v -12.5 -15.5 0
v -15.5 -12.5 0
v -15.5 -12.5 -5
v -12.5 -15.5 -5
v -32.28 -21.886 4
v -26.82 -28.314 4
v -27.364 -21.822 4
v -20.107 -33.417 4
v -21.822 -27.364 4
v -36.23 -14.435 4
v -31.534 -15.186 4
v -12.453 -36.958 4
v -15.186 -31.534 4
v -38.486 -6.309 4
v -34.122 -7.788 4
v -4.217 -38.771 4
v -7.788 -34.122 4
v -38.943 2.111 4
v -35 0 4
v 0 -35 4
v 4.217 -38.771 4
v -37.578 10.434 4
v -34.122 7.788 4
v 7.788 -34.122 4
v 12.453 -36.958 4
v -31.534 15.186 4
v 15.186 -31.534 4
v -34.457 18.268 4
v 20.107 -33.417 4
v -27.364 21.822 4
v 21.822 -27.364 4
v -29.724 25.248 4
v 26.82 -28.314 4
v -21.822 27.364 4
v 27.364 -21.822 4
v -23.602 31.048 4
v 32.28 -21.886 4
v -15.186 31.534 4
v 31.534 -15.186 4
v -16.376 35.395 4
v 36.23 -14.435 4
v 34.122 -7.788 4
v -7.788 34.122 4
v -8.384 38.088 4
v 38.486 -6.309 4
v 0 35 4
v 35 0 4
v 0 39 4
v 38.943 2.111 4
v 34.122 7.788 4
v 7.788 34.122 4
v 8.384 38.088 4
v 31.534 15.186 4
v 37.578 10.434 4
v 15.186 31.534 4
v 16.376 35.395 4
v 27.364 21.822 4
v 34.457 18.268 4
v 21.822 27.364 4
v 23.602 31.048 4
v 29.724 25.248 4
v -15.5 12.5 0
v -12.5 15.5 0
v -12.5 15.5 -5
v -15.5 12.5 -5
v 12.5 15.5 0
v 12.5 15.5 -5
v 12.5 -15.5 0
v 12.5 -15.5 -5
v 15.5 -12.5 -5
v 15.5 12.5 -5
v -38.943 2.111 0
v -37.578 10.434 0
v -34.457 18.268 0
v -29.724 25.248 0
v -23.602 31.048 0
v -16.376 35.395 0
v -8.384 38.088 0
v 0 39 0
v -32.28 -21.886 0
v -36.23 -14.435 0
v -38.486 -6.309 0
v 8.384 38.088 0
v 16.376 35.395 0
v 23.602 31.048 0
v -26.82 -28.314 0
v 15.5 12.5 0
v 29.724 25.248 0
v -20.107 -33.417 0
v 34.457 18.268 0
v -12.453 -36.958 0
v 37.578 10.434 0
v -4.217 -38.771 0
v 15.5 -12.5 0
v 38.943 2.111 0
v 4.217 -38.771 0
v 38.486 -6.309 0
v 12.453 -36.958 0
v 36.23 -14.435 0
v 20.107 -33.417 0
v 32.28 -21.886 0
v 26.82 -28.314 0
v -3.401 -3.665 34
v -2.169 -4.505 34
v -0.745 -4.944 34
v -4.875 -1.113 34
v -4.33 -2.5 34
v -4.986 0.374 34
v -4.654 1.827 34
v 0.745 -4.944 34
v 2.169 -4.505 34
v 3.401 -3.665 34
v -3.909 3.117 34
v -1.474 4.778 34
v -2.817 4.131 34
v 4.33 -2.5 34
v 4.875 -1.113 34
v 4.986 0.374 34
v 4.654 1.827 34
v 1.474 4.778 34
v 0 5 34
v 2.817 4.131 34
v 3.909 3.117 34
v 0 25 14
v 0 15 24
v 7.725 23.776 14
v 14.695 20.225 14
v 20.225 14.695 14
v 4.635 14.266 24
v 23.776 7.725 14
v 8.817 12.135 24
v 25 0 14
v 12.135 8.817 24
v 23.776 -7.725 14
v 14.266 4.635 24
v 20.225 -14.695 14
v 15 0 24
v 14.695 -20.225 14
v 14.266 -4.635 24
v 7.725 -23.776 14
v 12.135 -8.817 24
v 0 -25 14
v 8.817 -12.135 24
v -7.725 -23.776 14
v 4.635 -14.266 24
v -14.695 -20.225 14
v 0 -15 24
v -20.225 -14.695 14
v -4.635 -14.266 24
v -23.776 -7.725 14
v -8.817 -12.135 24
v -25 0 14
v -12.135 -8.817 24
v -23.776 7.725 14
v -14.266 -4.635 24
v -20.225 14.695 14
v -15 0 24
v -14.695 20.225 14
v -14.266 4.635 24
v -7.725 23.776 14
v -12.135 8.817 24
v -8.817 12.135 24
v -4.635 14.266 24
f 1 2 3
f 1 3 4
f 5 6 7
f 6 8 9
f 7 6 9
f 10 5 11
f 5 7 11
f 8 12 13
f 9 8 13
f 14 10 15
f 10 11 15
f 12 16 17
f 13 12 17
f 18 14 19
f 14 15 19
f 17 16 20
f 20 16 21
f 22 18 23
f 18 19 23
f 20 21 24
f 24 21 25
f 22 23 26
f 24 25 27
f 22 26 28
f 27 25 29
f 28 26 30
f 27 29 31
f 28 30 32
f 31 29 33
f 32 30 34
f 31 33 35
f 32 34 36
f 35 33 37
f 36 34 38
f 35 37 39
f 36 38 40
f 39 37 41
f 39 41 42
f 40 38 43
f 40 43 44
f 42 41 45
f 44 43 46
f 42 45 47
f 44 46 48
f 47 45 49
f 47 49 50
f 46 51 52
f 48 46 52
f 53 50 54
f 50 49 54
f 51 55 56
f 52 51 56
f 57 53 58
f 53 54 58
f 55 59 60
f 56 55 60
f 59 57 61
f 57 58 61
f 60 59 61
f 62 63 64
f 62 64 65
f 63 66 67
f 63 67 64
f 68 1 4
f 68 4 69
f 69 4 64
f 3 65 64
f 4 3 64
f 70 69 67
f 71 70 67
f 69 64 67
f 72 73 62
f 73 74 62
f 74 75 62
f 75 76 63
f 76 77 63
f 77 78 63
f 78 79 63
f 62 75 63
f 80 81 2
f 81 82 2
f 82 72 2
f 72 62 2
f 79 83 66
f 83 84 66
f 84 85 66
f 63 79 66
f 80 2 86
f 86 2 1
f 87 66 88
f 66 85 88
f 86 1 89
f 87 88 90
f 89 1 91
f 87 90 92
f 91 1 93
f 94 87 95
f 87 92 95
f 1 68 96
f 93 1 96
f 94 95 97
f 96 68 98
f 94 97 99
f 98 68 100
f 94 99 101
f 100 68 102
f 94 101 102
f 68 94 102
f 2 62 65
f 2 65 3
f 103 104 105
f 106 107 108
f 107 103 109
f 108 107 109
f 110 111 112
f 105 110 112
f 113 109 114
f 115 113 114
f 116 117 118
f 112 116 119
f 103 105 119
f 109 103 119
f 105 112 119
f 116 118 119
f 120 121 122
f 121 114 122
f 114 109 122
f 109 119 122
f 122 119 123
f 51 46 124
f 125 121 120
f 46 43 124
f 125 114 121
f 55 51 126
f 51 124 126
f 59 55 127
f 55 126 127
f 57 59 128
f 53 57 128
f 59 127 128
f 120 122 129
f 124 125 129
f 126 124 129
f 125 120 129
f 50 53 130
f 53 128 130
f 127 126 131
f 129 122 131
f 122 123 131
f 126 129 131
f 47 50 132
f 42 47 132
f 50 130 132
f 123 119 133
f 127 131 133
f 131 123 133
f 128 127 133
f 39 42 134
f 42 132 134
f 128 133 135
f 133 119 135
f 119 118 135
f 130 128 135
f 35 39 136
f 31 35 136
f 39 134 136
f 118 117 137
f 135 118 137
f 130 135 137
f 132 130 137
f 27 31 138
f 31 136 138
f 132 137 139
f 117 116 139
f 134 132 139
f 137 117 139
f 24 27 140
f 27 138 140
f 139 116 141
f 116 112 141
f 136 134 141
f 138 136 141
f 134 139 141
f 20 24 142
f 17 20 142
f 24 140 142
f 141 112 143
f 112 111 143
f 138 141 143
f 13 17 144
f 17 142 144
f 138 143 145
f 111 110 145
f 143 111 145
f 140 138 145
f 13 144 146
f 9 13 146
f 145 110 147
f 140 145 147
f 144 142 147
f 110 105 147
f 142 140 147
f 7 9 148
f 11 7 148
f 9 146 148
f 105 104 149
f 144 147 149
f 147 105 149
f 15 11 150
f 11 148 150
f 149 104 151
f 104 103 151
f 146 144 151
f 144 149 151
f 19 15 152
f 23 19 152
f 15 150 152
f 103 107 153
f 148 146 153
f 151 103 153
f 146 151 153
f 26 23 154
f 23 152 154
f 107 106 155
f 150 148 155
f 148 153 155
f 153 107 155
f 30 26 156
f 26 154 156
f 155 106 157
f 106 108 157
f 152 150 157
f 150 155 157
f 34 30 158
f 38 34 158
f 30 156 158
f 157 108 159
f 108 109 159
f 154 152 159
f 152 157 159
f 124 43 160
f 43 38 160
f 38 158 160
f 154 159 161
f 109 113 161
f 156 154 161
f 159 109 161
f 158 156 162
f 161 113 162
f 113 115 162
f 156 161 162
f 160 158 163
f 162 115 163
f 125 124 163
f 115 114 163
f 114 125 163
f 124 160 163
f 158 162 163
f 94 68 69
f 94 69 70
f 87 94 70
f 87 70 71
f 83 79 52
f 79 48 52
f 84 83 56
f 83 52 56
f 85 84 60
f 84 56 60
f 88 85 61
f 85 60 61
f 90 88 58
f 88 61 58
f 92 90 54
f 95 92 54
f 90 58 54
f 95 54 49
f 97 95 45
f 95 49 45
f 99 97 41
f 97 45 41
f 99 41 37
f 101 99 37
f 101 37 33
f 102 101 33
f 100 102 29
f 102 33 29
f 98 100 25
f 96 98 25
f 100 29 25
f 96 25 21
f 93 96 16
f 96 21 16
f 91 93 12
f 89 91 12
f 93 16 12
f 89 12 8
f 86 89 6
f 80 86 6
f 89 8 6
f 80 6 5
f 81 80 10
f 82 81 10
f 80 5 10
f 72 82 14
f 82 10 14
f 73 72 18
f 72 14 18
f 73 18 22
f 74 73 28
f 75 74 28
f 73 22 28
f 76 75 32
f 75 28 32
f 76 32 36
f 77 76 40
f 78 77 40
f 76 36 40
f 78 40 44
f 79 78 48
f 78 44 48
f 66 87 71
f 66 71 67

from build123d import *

# Parameters (mm, degrees)
EXTRUDE_1_DEPTH = 5


with BuildPart() as part:
    # Эскиз1 → Повернуть1 (revolve)
    with BuildSketch(Plane(origin=(0, 0, 0), x_dir=(0, 0, -1), z_dir=(1, 0, 0))):
        Polygon((0, 0), (0, 39), (-4, 39), (-4, 35), (-34, 5), (-34, 0), align=None)
    revolve(axis=Axis((0, 0, 926.802095793), (0, 0, -1)))

    # Эскиз2 → Бобышка-Вытянуть1 (add)
    with BuildSketch(Plane(origin=(0, 0, 0), x_dir=(-1, 0, 0), z_dir=(0, 0, -1))):
        Polygon((12.5, -15.5), (-12.5, -15.5), (-15.5, -12.5), (-15.5, 12.5), (-12.5, 15.5), (12.5, 15.5), (15.5, 12.5), (15.5, -12.5), align=None)
    extrude(amount=EXTRUDE_1_DEPTH)


solid = part.part
